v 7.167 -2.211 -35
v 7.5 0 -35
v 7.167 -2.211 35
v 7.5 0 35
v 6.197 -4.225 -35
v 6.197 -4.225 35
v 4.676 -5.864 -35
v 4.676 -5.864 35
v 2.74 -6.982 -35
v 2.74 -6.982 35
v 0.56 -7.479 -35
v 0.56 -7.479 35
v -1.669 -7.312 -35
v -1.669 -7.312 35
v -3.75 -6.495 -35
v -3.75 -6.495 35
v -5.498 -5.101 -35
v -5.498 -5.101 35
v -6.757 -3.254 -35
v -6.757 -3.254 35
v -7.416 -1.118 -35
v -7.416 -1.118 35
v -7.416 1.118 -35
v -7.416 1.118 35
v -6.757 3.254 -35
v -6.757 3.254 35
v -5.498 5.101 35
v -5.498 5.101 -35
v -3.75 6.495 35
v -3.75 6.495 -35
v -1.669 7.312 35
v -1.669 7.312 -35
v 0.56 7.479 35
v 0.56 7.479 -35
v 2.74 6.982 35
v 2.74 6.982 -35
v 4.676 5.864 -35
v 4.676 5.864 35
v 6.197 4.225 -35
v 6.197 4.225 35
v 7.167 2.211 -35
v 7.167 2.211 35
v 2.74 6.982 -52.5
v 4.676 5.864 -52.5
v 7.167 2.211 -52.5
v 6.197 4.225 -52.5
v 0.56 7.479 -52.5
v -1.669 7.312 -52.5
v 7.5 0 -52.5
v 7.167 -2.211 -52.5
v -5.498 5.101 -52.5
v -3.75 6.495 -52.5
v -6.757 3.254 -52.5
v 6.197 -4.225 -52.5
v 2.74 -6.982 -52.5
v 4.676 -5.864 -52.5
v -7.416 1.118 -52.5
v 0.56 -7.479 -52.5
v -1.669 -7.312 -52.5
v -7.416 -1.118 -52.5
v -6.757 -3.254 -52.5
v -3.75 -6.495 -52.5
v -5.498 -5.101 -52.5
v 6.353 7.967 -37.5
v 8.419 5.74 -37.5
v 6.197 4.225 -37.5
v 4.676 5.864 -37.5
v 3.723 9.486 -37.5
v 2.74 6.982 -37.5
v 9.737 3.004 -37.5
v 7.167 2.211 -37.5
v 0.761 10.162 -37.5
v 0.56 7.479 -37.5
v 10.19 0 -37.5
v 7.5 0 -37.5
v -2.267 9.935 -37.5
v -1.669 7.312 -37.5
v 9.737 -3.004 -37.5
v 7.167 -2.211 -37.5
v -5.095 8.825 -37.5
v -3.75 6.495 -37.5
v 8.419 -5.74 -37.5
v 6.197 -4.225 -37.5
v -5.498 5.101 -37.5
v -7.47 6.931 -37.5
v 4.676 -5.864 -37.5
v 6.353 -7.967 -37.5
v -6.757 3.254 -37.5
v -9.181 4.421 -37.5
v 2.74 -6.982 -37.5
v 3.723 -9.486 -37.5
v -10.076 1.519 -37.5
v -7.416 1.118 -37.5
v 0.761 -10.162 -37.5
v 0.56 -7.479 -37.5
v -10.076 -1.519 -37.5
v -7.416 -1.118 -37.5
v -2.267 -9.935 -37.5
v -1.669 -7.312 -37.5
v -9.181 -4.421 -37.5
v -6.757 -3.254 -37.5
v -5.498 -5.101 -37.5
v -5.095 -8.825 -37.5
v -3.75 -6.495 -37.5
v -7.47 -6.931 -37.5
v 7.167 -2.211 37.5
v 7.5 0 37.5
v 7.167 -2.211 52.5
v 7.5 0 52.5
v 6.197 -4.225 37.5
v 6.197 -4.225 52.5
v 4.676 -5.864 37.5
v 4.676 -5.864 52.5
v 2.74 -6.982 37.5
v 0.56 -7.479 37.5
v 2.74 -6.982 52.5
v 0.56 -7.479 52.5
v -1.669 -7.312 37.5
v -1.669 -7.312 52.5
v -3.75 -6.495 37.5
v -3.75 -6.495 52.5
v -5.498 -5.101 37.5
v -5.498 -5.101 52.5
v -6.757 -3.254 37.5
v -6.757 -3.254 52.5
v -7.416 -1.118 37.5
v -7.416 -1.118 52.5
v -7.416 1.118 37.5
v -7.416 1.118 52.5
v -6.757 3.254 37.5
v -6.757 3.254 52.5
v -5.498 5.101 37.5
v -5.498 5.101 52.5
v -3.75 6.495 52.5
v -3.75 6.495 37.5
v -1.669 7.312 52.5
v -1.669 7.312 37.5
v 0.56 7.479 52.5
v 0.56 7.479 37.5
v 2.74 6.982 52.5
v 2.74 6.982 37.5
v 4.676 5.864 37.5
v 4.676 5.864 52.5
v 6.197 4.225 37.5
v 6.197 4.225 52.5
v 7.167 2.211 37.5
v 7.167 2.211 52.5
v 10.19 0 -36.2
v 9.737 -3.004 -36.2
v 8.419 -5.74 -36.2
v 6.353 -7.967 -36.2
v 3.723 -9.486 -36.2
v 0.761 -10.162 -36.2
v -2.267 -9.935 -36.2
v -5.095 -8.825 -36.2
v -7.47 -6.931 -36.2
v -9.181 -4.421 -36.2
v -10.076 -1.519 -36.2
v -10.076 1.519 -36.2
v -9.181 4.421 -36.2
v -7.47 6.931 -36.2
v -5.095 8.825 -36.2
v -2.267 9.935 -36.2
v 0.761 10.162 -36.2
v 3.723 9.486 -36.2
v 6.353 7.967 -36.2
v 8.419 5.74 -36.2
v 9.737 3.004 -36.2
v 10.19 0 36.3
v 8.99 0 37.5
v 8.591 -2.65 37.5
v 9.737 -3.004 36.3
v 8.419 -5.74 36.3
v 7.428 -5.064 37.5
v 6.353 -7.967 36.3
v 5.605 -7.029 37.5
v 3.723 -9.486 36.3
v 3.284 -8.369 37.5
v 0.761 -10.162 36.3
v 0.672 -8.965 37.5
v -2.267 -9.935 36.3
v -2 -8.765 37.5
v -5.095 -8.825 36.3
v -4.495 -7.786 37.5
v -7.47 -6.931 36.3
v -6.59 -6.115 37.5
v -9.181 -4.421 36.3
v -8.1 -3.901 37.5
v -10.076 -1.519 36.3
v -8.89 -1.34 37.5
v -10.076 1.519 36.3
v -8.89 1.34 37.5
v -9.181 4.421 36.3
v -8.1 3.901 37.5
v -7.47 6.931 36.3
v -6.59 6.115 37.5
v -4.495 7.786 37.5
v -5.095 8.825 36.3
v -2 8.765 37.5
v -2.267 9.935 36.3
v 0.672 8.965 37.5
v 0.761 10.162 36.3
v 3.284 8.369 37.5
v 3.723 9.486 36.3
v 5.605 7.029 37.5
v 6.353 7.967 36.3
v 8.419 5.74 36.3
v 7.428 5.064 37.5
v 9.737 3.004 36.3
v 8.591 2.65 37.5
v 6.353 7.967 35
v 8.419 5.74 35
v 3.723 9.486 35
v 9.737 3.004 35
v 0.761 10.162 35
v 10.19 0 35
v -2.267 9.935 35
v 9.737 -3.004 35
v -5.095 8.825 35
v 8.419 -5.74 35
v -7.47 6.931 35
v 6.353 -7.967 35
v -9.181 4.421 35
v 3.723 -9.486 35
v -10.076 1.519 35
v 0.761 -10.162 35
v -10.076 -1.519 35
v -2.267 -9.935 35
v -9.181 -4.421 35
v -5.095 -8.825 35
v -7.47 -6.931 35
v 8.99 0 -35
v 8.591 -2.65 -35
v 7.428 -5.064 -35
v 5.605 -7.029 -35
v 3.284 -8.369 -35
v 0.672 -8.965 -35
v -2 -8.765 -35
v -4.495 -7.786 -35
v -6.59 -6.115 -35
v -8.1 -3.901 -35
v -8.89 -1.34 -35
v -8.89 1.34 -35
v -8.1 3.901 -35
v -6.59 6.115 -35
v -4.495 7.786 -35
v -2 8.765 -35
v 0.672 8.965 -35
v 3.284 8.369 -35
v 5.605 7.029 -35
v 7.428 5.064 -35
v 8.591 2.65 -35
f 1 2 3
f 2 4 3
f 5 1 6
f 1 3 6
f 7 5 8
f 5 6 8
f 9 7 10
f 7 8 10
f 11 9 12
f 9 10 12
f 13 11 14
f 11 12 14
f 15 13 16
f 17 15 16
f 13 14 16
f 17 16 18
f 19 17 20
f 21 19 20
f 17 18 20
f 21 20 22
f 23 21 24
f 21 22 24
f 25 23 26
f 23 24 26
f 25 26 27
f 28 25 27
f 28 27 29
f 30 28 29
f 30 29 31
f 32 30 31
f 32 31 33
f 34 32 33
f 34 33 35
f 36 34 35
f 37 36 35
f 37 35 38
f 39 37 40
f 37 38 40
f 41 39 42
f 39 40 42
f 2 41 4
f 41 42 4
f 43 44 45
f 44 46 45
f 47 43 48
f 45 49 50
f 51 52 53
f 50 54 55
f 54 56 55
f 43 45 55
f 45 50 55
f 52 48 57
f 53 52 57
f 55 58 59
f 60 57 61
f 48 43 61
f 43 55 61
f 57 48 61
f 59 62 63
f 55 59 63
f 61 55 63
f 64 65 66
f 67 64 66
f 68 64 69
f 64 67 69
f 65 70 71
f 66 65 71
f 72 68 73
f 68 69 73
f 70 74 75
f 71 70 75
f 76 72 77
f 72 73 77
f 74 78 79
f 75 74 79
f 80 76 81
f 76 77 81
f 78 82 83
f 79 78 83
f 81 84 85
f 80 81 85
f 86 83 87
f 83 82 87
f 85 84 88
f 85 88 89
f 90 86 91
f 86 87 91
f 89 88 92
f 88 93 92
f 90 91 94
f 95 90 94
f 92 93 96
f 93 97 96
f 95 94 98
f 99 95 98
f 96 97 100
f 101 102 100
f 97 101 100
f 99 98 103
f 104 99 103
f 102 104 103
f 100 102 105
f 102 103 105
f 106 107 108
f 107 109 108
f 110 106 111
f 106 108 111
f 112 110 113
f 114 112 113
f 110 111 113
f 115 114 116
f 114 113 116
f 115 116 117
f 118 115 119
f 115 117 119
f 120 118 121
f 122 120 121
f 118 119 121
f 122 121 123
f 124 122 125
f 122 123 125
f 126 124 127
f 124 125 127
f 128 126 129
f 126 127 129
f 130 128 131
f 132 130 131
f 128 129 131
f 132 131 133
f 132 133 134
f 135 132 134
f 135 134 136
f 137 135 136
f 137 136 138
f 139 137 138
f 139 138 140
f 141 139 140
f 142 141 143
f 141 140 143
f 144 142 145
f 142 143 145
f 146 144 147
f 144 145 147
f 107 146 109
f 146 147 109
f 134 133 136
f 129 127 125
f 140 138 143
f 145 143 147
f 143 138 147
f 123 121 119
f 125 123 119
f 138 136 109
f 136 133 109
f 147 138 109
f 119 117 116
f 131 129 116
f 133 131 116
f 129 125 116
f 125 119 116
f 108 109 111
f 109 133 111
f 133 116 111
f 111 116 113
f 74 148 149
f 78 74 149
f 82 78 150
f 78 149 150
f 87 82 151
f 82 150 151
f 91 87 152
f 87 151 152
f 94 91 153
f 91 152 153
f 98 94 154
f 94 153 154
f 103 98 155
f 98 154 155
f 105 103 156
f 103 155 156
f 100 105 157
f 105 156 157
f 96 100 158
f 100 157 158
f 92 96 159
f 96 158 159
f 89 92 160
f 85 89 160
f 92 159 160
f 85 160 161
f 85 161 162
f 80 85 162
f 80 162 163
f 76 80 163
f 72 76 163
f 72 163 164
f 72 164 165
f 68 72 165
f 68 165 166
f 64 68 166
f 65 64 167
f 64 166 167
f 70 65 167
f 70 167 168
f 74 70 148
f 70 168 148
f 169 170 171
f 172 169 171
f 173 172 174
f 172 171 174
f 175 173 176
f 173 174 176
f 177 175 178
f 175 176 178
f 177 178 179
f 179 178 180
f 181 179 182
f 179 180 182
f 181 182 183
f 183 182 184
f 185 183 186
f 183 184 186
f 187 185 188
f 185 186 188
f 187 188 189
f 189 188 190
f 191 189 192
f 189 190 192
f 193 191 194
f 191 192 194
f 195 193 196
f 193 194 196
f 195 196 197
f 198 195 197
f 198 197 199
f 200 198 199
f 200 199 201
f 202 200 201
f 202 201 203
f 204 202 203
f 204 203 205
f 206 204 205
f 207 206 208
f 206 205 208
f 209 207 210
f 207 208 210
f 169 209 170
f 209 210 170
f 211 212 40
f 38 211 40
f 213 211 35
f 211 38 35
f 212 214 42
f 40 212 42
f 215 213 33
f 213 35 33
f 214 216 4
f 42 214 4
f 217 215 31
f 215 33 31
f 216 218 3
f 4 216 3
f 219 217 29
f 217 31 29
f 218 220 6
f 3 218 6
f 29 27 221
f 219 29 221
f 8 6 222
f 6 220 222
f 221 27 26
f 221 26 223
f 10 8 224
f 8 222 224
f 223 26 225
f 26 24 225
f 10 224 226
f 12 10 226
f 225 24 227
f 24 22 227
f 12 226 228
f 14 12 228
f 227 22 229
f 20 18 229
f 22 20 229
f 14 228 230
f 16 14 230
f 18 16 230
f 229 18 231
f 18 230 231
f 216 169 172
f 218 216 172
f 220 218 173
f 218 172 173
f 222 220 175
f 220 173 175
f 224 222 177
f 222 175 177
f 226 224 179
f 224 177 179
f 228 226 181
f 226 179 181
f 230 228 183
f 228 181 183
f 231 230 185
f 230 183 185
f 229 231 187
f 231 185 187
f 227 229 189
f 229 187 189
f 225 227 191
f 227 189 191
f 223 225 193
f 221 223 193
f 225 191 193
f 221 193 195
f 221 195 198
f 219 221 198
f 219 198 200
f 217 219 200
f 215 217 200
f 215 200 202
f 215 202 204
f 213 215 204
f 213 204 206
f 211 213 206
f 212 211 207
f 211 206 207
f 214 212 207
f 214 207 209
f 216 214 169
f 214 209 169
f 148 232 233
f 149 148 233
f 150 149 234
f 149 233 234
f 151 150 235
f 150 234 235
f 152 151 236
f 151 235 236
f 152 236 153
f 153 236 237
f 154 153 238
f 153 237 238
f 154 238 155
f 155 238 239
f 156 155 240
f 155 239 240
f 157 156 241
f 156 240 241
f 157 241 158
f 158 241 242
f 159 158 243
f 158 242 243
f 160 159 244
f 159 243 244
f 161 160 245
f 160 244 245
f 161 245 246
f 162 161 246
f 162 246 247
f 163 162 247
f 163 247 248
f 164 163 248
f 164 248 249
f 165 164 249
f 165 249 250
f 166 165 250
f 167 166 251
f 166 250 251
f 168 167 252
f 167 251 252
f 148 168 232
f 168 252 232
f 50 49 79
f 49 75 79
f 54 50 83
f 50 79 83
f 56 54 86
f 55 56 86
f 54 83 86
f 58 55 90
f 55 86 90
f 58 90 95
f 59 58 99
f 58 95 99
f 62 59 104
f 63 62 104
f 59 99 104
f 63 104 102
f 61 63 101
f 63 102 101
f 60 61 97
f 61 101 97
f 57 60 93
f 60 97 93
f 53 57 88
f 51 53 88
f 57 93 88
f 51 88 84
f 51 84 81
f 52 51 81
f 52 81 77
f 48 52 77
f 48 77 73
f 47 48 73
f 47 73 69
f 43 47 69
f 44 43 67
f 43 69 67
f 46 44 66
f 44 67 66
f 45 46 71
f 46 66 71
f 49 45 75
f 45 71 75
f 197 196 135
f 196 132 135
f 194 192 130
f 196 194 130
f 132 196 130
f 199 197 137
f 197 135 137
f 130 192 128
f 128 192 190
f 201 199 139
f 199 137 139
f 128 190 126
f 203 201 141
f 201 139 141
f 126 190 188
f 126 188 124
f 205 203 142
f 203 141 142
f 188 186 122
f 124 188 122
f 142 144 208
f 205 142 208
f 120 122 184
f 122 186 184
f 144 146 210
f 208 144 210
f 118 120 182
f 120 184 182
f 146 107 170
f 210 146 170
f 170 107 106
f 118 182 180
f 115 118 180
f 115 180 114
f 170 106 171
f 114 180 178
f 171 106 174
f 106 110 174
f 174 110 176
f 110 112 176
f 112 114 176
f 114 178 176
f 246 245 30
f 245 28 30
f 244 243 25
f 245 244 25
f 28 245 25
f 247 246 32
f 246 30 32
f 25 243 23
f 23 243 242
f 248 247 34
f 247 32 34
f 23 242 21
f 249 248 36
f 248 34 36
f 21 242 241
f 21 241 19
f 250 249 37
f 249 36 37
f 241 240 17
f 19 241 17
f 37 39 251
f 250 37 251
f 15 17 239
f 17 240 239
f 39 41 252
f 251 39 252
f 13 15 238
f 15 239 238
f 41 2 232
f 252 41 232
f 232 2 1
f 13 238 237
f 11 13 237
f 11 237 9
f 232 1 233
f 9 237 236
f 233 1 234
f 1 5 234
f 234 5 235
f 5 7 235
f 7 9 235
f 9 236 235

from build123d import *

# Parameters (mm, degrees)
F2_SIZE = 1.2


with BuildPart() as f1:
    # F0 (on Front) → F1 (revolve)
    with BuildSketch(Plane.XZ):
        Polygon((7.5, 52.5), (0, 52.5), (0, -52.5), (7.5, -52.5), (7.5, -37.5), (10.19, -37.5), (10.19, -35), (7.5, -35), (7.5, 35), (10.19, 35), (10.19, 37.5), (7.5, 37.5), align=None)
    revolve(axis=Axis((0, 0, 0.15672), (0, 0, -1)))

    # F2
    f2_edges = [f1.edges().sort_by_distance(p)[0] for p in [
        (-10.19, 0, 37.5),
        (-10.19, 0, -35),
    ]]
    chamfer(f2_edges, length=F2_SIZE)


solid = f1.part
